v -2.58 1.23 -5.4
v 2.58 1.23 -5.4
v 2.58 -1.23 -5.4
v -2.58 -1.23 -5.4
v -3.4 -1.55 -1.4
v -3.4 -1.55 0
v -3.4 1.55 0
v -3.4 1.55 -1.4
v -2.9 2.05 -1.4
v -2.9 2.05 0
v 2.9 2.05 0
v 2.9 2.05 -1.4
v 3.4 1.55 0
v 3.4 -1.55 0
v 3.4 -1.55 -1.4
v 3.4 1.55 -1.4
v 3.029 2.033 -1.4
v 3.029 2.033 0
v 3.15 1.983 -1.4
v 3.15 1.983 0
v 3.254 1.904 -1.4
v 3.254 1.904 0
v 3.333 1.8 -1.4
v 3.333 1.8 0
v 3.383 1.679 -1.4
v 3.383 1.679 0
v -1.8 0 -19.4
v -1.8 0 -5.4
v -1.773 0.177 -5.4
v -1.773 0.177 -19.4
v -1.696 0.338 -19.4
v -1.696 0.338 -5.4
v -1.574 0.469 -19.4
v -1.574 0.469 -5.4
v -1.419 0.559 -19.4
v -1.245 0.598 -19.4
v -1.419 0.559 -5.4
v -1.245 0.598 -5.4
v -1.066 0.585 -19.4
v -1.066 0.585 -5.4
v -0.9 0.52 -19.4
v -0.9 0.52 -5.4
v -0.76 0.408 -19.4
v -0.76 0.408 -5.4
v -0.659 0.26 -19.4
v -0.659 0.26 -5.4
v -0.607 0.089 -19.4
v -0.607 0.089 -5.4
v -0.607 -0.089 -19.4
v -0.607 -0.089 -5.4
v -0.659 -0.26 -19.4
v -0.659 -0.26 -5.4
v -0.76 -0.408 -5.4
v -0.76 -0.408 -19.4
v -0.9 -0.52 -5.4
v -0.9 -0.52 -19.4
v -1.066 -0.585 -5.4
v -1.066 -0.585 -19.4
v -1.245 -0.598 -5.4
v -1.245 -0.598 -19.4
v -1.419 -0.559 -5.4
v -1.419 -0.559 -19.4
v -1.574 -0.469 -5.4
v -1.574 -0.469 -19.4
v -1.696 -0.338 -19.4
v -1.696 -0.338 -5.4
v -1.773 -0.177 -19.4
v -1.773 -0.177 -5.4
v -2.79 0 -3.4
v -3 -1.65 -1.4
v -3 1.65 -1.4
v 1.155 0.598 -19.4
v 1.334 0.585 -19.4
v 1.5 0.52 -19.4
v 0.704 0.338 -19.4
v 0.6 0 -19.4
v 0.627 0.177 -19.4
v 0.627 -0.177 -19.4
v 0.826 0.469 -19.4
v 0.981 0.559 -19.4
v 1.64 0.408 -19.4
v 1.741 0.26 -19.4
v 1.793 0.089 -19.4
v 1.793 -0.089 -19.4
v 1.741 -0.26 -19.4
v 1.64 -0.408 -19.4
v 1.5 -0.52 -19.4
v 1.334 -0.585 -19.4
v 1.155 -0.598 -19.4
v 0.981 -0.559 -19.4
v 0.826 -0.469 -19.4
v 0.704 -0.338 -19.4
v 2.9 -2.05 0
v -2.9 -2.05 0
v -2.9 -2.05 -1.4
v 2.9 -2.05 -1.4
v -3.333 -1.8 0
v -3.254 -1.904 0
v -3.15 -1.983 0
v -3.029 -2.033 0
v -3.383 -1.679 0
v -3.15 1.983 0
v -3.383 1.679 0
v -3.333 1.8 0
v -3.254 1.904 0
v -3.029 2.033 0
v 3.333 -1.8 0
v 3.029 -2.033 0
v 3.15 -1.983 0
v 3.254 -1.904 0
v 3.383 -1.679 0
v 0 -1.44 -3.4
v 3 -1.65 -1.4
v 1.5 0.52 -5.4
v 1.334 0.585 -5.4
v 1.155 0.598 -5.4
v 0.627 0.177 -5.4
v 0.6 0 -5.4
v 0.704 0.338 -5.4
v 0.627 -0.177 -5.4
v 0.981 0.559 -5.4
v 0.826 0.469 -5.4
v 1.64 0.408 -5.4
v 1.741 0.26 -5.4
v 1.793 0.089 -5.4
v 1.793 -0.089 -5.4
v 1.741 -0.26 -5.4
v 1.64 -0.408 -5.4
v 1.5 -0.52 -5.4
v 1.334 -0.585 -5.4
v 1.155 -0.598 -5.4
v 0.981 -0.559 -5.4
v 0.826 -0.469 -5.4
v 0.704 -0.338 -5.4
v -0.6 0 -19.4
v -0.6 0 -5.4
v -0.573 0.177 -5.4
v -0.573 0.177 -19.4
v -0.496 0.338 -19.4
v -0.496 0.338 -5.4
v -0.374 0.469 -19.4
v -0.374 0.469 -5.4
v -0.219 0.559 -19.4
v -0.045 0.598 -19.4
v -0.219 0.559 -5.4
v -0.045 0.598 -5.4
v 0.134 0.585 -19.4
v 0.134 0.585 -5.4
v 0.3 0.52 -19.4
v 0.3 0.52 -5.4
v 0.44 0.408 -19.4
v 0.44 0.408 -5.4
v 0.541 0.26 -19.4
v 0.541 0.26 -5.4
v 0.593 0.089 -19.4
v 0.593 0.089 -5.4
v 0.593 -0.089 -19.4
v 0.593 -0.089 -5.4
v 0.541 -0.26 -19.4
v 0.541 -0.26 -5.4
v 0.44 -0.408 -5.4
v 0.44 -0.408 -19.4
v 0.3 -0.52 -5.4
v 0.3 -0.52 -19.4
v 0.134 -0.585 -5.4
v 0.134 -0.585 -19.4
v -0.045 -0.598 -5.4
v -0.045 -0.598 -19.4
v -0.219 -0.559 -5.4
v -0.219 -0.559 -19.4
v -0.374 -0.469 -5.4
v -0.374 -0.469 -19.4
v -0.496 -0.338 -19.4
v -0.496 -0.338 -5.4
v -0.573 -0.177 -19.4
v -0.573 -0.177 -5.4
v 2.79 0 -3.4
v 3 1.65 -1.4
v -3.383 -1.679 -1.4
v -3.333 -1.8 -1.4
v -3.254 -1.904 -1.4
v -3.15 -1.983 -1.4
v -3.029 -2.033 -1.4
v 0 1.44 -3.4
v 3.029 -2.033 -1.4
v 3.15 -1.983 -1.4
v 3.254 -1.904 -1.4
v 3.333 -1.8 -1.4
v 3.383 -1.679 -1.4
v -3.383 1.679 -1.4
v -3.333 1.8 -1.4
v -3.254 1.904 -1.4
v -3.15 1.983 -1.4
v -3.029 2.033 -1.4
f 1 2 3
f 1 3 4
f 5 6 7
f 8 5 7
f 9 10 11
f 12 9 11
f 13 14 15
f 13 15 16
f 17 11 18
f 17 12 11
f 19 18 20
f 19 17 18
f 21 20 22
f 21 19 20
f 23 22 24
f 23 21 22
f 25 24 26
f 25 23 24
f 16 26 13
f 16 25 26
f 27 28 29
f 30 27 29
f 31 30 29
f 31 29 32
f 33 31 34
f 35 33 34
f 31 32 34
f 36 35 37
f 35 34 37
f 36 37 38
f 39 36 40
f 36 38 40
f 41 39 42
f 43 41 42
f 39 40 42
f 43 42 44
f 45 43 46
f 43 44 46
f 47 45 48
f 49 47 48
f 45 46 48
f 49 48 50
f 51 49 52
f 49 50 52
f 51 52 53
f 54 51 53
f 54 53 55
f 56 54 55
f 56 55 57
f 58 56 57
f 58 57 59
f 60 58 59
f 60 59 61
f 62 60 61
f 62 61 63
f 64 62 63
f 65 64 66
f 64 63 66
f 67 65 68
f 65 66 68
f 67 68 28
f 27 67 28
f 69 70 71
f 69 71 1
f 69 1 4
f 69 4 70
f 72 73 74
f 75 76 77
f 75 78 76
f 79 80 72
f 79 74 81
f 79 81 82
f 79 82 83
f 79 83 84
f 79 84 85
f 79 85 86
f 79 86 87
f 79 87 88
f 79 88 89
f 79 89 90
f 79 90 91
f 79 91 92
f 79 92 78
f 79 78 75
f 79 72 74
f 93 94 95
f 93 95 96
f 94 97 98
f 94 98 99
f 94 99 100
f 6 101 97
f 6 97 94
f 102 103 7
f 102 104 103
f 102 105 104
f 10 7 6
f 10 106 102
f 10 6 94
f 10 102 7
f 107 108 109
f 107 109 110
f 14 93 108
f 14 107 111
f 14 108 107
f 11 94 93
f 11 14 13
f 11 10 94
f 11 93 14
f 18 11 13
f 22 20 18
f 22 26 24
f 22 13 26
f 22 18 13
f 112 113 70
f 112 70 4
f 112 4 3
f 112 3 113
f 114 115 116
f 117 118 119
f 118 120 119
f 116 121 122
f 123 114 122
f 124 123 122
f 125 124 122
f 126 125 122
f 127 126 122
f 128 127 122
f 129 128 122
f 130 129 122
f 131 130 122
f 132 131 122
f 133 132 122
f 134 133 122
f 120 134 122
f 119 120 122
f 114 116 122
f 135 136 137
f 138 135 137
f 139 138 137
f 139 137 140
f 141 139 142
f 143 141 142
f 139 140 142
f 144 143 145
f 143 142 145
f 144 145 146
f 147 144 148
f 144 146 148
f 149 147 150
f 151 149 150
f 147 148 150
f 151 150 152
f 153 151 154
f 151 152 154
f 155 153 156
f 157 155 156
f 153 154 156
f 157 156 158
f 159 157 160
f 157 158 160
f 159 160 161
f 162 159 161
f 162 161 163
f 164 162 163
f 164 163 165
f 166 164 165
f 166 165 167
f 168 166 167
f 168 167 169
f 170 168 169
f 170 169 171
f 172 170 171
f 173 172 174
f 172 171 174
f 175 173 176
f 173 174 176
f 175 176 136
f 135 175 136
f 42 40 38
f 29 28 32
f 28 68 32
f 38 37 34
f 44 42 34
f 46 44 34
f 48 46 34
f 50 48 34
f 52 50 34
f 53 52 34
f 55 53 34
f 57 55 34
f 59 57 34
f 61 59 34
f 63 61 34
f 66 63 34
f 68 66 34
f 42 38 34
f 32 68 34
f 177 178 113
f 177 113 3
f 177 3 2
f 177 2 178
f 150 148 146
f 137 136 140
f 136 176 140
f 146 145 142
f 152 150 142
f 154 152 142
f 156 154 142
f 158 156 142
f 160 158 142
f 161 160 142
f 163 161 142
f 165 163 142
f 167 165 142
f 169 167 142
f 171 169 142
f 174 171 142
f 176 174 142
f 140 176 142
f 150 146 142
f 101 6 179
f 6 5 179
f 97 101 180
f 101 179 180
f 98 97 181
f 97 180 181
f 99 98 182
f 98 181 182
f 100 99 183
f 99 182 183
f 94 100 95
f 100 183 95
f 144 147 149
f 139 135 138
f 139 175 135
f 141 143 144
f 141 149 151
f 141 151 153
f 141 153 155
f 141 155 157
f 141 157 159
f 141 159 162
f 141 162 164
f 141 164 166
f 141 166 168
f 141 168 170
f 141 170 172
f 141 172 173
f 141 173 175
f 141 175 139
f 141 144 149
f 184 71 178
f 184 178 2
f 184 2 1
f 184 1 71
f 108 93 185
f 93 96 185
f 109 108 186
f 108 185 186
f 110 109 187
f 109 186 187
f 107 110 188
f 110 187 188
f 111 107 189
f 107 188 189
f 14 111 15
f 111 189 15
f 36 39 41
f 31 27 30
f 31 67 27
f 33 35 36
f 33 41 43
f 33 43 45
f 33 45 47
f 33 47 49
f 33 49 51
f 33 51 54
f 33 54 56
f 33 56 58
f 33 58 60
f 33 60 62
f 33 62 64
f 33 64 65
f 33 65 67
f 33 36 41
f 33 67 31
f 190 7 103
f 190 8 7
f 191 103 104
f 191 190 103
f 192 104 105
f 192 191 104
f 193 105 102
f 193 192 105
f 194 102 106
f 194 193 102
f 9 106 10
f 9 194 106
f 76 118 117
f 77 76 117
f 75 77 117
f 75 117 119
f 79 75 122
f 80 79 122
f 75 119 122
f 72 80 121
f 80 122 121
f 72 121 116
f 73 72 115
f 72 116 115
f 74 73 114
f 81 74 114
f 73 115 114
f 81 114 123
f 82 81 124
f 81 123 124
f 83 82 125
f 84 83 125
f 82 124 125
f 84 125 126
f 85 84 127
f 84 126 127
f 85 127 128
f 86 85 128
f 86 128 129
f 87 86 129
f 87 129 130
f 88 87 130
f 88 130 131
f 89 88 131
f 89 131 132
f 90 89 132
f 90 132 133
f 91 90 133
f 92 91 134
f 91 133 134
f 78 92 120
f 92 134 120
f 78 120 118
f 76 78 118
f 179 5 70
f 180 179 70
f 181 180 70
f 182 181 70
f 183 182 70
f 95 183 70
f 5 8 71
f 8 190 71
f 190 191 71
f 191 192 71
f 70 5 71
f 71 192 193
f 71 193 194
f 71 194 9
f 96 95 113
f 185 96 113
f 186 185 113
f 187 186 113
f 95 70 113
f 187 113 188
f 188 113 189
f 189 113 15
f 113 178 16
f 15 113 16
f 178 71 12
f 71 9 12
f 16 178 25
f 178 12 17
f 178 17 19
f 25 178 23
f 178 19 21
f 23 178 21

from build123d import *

# Parameters (mm, degrees)
SKETCH1_W           = 6.8
SKETCH1_H           = 4.1
BOSS_EXTRUDE1_DEPTH = 1.4
SKETCH2_W           = 6
SKETCH2_H           = 3.3
BOSS_EXTRUDE2_DEPTH = 4
BOSS_EXTRUDE2_TAPER = 6
FILLET1_R           = 0.5
SKETCH3_R           = 0.6
POSITIVE_DEPTH      = 14
SKETCH4_R           = 0.6
SIGNAL_DEPTH        = 14
SKETCH5_R           = 0.6
NEGATIVE_DEPTH      = 14


with BuildPart() as part:
    # Sketch1 → Boss-Extrude1 (new body)
    with BuildSketch(Plane.XY):
        Rectangle(SKETCH1_W, SKETCH1_H)
    extrude(amount=-BOSS_EXTRUDE1_DEPTH)

    # Sketch2 → Boss-Extrude2 (add)
    with BuildSketch(Plane(origin=(0, 0, -1.4), x_dir=(-1, 0, 0), z_dir=(0, 0, -1))):
        Rectangle(SKETCH2_W, SKETCH2_H)
    extrude(amount=BOSS_EXTRUDE2_DEPTH, taper=BOSS_EXTRUDE2_TAPER)

    # Fillet1
    fillet1_edges = [part.edges().sort_by_distance(p)[0] for p in [
        (3.4, -2.05, -0.7),
        (-3.4, -2.05, -0.7),
        (-3.4, 2.05, -0.7),
        (3.4, 2.05, -0.7),
    ]]
    fillet(fillet1_edges, radius=FILLET1_R)


with BuildPart() as body_2:
    # Sketch3 → POSITIVE (new body)
    with BuildSketch(Plane(origin=(0, 0, -5.4), x_dir=(-1, 0, 0), z_dir=(0, 0, -1))):
        Circle(SKETCH3_R)
    extrude(amount=POSITIVE_DEPTH)


with BuildPart() as body_3:
    # Sketch4 → SIGNAL (new body)
    with BuildSketch(Plane(origin=(0, 0, -5.4), x_dir=(-1, 0, 0), z_dir=(0, 0, -1))):
        with Locations((1.2, 0)):
            Circle(SKETCH4_R)
    extrude(amount=SIGNAL_DEPTH)


with BuildPart() as body_4:
    # Sketch5 → NEGATIVE (new body)
    with BuildSketch(Plane(origin=(0, 0, -5.4), x_dir=(-1, 0, 0), z_dir=(0, 0, -1))):
        with Locations((-1.2, 0)):
            Circle(SKETCH5_R)
    extrude(amount=NEGATIVE_DEPTH)


solid = Compound([part.part, body_2.part, body_3.part, body_4.part])
